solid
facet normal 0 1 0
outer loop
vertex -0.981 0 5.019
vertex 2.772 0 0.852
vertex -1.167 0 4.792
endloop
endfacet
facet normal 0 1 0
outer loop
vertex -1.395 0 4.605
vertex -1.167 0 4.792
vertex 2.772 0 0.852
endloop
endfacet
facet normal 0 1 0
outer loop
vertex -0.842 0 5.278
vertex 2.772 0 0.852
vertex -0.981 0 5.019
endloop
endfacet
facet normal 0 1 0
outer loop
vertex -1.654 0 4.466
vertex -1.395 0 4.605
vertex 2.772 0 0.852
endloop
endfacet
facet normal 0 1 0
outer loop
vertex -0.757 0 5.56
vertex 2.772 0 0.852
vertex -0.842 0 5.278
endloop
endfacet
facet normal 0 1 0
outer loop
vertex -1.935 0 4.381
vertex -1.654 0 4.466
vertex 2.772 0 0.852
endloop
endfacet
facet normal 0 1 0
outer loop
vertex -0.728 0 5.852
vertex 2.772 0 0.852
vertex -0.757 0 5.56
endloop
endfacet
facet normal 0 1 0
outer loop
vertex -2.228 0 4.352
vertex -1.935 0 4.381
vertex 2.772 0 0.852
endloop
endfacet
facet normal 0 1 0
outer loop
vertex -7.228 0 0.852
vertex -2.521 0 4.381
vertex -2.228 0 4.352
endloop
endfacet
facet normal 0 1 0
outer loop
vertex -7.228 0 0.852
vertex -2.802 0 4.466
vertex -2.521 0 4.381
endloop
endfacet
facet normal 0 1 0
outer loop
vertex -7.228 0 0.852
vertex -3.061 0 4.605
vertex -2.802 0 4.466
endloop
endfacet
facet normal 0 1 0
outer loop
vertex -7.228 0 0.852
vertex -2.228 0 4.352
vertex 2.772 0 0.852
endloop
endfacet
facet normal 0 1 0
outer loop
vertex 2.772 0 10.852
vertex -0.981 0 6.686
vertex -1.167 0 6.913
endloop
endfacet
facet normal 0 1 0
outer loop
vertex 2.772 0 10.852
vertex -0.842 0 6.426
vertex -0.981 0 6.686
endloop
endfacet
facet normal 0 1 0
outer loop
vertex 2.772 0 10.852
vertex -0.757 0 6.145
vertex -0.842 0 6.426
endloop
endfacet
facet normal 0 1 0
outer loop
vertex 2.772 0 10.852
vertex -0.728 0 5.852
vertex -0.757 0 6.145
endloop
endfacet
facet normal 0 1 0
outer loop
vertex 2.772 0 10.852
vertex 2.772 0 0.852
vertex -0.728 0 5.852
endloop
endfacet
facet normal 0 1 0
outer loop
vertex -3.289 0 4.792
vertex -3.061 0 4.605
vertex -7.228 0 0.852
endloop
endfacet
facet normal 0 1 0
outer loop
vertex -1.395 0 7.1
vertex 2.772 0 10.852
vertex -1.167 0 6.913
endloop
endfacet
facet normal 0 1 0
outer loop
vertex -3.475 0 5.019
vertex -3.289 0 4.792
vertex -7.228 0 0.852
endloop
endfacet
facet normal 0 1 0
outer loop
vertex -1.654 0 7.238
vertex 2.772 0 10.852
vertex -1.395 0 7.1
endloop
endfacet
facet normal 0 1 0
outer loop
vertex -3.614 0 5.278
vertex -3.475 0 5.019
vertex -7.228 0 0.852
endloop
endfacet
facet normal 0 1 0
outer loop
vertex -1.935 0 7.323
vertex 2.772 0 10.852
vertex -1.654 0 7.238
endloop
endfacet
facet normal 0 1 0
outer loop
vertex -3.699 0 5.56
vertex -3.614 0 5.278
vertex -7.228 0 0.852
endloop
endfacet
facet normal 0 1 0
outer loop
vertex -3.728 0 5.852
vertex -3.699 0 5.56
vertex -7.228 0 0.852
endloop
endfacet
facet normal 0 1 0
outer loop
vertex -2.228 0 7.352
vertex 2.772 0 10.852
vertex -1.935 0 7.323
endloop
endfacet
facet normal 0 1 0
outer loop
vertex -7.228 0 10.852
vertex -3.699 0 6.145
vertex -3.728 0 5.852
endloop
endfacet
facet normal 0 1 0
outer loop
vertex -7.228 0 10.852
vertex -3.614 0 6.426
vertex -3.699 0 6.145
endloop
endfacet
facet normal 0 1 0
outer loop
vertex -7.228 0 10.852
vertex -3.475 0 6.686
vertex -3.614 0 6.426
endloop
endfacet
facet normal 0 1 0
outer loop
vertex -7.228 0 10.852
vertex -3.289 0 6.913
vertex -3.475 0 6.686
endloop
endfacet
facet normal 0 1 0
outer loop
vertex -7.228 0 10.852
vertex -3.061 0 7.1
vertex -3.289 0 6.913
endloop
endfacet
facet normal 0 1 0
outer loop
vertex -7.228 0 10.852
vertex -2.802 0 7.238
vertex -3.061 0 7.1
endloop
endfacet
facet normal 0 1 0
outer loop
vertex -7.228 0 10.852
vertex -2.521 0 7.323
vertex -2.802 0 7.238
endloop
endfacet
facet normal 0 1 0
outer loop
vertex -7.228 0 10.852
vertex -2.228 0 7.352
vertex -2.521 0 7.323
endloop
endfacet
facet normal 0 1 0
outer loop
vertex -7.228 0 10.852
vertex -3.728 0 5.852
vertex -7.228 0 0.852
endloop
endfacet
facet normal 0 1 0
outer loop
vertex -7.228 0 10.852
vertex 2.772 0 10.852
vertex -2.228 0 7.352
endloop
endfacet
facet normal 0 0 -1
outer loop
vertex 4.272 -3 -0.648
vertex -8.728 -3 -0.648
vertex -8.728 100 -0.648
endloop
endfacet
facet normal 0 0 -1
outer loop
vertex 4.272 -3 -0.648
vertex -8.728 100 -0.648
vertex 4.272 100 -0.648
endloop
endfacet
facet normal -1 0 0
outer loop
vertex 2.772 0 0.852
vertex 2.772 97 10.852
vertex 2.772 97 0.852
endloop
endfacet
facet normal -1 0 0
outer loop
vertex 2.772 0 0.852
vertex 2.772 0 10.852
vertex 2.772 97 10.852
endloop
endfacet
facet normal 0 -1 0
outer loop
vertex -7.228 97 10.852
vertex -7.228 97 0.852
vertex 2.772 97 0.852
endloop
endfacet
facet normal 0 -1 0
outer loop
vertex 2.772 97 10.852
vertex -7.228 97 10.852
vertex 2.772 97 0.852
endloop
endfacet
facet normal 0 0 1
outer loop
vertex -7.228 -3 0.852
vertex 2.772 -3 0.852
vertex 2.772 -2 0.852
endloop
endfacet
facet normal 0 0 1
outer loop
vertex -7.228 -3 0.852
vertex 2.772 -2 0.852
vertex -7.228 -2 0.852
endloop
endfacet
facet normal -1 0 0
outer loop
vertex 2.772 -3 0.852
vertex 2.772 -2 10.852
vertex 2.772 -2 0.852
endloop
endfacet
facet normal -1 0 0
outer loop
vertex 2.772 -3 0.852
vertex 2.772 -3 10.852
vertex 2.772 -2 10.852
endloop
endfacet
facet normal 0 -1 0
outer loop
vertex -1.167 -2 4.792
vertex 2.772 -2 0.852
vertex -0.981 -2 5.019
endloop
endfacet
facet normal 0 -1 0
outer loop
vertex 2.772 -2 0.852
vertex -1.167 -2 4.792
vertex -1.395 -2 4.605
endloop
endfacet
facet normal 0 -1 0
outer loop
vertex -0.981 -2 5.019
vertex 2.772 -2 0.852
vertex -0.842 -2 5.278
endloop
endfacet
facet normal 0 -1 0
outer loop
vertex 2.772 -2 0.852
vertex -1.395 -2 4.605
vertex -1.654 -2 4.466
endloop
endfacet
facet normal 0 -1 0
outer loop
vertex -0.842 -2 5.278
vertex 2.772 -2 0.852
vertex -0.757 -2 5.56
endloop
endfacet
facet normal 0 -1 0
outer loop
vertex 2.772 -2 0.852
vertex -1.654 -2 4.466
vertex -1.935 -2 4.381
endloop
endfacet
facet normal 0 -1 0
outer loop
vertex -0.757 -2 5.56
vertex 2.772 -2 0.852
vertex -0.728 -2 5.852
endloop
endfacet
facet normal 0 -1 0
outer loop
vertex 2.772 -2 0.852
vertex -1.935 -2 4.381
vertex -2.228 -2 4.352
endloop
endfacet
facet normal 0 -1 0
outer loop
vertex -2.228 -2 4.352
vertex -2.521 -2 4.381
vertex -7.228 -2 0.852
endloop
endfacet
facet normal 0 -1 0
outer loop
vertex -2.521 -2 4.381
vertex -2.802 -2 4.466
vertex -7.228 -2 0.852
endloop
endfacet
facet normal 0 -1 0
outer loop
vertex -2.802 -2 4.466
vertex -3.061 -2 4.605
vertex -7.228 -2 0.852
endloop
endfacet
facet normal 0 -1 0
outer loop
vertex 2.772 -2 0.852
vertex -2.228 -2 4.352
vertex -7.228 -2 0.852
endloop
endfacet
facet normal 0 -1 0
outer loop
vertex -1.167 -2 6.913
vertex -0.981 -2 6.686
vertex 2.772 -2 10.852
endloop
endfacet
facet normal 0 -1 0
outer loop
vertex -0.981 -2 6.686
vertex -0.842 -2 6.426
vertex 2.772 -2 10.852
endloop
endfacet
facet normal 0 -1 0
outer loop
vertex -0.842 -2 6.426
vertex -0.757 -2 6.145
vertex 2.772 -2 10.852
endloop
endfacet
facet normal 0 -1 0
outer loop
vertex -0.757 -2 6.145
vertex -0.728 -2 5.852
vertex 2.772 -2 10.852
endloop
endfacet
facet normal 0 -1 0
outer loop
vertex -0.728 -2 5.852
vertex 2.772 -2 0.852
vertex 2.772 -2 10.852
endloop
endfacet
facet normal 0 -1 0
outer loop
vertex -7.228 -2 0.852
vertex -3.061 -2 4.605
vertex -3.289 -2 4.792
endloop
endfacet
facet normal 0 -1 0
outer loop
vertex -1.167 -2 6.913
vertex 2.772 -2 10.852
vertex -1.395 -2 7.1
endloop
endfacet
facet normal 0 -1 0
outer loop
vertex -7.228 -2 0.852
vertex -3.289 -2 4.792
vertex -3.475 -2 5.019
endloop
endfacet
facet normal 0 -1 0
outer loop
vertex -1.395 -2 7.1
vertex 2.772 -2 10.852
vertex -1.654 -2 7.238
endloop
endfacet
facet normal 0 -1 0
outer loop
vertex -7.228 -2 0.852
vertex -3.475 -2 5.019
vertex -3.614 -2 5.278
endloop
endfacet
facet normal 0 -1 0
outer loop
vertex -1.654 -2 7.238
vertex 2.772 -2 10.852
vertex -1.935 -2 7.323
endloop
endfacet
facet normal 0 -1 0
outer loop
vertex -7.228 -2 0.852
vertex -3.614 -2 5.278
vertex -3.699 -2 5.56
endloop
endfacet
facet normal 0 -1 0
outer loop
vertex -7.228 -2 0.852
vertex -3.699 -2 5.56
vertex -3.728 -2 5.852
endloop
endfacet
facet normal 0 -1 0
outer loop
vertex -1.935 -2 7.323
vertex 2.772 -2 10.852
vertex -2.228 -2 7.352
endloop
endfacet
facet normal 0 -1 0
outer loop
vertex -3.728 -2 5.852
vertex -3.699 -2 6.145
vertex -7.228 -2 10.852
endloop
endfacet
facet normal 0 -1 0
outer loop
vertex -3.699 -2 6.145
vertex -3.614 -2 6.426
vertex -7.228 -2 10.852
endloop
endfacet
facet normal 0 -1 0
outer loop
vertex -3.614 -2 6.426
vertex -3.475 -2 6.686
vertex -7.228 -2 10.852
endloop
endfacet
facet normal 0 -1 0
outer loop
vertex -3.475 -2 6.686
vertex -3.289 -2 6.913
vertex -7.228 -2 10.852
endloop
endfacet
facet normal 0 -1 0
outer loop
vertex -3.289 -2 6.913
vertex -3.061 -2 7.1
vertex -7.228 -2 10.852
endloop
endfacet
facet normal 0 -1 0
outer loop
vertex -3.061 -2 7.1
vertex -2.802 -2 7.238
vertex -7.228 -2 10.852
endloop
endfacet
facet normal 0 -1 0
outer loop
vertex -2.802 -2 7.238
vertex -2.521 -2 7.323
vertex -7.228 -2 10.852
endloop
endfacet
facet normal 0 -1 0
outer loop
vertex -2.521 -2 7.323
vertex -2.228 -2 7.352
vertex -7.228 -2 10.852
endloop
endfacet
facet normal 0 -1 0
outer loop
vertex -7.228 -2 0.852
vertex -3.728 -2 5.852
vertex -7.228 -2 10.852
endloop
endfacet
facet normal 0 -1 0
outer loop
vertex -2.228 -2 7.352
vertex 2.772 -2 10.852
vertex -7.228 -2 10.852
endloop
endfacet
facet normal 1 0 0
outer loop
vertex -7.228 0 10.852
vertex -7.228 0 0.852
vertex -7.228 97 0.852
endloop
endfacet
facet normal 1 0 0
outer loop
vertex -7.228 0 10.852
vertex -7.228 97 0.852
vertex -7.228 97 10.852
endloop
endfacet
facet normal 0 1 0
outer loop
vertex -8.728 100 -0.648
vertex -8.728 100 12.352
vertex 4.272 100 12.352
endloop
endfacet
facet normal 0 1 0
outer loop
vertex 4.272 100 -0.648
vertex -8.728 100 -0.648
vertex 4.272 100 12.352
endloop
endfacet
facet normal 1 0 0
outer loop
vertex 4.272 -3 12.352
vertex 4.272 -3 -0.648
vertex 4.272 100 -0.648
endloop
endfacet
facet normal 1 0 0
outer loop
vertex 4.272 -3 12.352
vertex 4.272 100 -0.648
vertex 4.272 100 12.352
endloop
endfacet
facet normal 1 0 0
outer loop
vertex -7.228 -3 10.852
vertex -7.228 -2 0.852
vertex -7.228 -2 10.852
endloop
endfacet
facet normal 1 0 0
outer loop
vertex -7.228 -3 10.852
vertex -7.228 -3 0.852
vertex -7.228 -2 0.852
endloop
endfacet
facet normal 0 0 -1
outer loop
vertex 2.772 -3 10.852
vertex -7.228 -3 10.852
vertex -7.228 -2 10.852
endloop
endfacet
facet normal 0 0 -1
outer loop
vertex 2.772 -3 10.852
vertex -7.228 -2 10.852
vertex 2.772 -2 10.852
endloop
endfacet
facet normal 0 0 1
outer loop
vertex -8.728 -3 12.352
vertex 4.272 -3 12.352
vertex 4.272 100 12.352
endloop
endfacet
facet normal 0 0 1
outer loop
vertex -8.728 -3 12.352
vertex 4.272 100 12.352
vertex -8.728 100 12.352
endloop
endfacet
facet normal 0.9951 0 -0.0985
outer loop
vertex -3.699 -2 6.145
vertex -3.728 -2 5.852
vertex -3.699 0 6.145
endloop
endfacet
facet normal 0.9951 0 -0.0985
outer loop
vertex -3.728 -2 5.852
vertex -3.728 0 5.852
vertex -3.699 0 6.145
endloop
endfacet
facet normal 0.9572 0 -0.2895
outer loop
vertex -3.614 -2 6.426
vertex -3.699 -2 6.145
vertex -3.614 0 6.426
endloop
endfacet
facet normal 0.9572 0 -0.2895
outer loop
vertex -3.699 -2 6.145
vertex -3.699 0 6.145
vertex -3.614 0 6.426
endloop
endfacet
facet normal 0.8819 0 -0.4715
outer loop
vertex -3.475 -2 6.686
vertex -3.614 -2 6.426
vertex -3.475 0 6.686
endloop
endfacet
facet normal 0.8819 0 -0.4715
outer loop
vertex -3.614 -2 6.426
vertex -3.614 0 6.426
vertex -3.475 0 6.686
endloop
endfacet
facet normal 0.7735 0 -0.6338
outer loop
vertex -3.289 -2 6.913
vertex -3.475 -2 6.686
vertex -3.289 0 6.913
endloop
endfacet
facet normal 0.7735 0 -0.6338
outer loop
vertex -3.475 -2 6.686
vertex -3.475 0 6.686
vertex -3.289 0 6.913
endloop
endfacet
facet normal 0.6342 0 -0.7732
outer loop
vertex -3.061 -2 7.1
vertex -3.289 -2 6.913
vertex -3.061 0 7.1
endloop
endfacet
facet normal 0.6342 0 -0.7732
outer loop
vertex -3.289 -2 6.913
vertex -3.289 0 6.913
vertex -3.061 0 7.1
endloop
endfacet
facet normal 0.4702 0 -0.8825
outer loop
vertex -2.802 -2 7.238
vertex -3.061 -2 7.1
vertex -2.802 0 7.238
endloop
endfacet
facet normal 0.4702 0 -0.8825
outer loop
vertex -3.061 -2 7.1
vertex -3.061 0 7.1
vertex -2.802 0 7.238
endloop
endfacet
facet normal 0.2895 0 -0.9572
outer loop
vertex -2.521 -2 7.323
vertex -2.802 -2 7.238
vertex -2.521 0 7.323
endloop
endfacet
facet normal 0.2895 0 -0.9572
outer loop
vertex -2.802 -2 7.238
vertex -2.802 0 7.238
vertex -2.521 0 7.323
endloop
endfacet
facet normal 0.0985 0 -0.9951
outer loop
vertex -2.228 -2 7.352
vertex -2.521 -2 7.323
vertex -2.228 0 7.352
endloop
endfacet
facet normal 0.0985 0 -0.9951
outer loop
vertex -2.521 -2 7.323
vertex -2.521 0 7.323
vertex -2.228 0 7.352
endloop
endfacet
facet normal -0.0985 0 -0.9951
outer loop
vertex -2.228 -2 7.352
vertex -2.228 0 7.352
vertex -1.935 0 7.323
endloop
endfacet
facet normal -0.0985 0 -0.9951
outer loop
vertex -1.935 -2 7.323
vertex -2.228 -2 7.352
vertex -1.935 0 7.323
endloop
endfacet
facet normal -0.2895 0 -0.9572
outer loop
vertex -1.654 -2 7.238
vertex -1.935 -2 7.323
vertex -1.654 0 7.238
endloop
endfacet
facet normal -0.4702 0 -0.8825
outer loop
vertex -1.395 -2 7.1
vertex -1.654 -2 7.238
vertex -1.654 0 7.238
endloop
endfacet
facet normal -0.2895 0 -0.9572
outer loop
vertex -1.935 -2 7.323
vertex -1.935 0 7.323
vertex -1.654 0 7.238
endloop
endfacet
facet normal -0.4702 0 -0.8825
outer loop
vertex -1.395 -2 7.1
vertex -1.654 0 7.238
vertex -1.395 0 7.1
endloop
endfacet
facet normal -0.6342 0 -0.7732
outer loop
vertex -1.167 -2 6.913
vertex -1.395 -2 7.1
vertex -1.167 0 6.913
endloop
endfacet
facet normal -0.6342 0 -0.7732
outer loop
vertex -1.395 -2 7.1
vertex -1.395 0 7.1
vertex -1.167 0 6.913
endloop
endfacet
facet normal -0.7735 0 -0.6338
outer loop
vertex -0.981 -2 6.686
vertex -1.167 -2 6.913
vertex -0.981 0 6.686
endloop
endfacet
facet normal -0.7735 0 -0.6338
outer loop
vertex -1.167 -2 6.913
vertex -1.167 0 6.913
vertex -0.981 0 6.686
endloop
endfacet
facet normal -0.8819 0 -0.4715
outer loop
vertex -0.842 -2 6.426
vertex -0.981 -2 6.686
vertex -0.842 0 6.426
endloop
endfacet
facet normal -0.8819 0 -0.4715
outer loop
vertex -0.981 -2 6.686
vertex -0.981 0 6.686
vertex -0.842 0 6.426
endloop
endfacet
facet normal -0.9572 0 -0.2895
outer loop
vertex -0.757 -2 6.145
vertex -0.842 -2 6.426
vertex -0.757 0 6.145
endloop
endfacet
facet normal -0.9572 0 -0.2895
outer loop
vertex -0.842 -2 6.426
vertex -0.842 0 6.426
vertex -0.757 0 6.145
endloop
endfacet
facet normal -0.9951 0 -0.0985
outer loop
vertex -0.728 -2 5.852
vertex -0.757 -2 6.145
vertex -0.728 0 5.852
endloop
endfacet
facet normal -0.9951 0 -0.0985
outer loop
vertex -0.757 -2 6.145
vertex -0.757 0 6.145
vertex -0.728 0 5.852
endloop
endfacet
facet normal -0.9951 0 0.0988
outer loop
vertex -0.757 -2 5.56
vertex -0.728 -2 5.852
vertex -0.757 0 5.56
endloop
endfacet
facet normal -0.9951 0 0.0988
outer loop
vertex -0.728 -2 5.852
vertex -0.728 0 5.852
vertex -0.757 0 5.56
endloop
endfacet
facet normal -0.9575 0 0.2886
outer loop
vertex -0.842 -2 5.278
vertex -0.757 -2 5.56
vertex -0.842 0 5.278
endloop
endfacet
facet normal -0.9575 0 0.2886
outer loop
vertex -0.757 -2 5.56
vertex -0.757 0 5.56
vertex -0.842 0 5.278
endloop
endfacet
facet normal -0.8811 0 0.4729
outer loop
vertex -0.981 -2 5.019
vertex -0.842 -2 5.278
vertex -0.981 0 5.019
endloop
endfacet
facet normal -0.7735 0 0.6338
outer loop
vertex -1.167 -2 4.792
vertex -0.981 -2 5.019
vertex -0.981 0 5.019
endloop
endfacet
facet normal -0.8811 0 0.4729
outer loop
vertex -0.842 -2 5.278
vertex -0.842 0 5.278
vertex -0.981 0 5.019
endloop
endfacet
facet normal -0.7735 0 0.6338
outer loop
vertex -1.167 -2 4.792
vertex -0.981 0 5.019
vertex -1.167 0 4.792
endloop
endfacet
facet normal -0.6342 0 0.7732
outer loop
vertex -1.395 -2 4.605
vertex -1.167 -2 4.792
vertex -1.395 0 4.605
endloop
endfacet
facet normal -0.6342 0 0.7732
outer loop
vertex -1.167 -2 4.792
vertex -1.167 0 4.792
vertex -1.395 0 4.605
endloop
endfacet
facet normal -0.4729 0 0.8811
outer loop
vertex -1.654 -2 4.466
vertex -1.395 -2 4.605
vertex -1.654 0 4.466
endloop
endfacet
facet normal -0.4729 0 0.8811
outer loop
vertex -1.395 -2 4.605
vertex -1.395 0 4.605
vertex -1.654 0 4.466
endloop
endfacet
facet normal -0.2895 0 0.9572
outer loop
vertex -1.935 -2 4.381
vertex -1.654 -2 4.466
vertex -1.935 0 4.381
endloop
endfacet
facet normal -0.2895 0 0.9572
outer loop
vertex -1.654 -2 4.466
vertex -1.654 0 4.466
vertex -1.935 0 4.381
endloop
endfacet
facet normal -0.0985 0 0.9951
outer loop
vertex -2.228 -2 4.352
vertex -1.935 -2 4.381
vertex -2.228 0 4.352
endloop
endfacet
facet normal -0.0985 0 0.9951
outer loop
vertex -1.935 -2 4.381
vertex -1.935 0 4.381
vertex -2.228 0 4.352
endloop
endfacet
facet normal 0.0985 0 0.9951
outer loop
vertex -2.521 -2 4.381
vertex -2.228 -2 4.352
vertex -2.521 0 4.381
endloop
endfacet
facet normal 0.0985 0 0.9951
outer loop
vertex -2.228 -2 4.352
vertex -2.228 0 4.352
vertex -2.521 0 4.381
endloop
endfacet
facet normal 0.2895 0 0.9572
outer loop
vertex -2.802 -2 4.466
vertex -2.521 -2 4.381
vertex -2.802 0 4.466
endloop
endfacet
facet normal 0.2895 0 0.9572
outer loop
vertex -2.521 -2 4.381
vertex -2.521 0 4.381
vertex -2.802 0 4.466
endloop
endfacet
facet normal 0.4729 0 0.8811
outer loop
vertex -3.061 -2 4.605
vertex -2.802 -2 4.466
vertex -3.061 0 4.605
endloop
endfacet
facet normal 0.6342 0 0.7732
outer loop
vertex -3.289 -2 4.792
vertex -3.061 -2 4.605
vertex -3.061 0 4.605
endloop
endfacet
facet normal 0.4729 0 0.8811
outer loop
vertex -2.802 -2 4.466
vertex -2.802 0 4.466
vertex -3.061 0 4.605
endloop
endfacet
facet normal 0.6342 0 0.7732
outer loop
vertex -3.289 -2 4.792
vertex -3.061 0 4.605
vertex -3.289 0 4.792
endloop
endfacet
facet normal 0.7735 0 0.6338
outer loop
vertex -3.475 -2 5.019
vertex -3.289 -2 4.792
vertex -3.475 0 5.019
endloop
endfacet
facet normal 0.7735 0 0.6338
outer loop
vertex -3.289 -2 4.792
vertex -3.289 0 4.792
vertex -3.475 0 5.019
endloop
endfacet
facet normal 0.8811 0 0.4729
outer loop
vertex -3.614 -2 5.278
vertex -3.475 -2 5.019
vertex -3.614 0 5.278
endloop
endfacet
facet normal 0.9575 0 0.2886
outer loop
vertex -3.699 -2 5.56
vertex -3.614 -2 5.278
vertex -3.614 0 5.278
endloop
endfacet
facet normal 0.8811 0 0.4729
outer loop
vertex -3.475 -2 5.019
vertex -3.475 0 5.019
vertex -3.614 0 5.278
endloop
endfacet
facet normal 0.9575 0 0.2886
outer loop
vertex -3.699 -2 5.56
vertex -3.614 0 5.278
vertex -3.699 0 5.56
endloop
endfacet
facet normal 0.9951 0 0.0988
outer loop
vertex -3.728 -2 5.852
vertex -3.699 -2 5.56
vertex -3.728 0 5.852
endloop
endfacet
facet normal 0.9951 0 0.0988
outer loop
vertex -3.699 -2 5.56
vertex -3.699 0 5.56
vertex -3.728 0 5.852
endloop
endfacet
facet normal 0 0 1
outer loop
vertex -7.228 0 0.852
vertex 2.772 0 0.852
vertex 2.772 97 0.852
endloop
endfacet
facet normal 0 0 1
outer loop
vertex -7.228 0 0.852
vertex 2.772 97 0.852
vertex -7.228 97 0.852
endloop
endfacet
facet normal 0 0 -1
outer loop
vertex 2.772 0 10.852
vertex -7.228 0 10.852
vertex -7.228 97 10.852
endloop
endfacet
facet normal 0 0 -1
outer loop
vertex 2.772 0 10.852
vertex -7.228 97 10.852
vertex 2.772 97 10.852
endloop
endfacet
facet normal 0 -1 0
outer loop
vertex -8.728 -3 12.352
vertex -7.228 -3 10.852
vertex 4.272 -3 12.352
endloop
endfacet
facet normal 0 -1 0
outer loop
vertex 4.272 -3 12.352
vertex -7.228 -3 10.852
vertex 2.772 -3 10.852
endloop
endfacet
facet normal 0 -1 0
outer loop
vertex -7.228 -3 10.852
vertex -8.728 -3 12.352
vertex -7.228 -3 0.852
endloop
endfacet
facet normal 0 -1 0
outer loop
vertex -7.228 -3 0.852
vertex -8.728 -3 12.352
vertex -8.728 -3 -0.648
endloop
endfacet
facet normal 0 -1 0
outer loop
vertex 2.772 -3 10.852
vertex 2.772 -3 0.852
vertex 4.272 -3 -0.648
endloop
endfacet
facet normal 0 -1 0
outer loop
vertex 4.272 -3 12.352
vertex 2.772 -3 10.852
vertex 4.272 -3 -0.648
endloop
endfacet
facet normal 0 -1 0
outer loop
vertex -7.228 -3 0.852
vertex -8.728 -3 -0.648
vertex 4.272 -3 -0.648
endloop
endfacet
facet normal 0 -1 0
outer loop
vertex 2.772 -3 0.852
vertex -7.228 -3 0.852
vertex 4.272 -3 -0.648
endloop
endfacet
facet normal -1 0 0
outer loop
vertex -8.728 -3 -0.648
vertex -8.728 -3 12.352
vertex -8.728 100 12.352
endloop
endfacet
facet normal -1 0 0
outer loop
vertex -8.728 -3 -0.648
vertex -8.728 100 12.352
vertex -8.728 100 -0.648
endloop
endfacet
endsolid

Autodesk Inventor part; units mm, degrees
ref_plane "YZ Plane" through (0, 0, 0) normal (1, 0, 0) x (0, 1, 0)
ref_plane "XZ Plane" through (0, 0, 0) normal (0, 1, 0) x (-1, 0, 0)
ref_plane "XY Plane" through (0, 0, 0) normal (0, 0, 1) x (1, 0, 0)
sketch "Sketch1" plane through (0, 0, 0) normal (0, 1, 0) x (-1, 0, 0)
  circle A0 centre (2.2281, 5.8523) radius 1.5 projected
  circle A1 centre (2.2281, 5.8523) radius 3.5
  line L0 (2.2281, 2.3523) -> (-0.803, 4.1023)
  line L1 (-0.803, 4.1023) -> (-0.803, 7.6023)
  line L2 (-0.803, 7.6023) -> (2.2281, 9.3523)
  line L3 (2.2281, 9.3523) -> (5.2592, 7.6023)
  line L4 (5.2592, 7.6023) -> (5.2592, 4.1023)
  line L5 (5.2592, 4.1023) -> (2.2281, 2.3523)
  point P0 (0, 0)
  dimension "d0" = 7
extrude "Extrusion1" add sketch "Sketch1" against normal blind 2 contours L4 L5 L0 L1 L2 L3
thread "Thread1" size "M3x0.5" class "6H" standard "ANSI Metric M Profile" full length
sketch "Sketch2" plane through (0, -2, 0) normal (0, -1, 0) x (1, 0, 0)
  line L0 (-5.2592, 7.6023) -> (-5.2592, 4.1023) projected
  line L1 (-5.2592, 4.1023) -> (-2.2281, 2.3523) projected
  line L2 (-2.2281, 2.3523) -> (0.803, 4.1023) projected
  line L3 (0.803, 4.1023) -> (0.803, 7.6023) projected
  line L4 (0.803, 7.6023) -> (-2.2281, 9.3523) projected
  line L5 (-2.2281, 9.3523) -> (-5.2592, 7.6023) projected
  circle A0 centre (-2.2281, 5.8523) radius 1.5 projected
  line L6 (-7.2281, 0.8523) -> (2.7719, 0.8523)
  line L7 (2.7719, 0.8523) -> (2.7719, 10.8523)
  line L8 (2.7719, 10.8523) -> (-7.2281, 10.8523)
  line L9 (-7.2281, 10.8523) -> (-7.2281, 0.8523)
  line L10 (-7.2281, 0.8523) -> (2.7719, 10.8523) construction
  line L11 (2.7719, 0.8523) -> (-7.2281, 10.8523) construction
  point P0 (0, 0)
  dimension "d5" = 10
  dimension "d6" = 10
extrude "Extrusion2" add sketch "Sketch2" against normal blind 2 contours L9 L8 L7 L6
sketch "Sketch3" plane through (0, 0, 0) normal (0, 1, 0) x (1, 0, 0)
  line L0 (2.7719, -10.8523) -> (2.7719, -0.8523) projected
  line L1 (2.7719, -0.8523) -> (-7.2281, -0.8523) projected
  line L2 (-7.2281, -0.8523) -> (-7.2281, -10.8523) projected
  line L3 (-7.2281, -10.8523) -> (2.7719, -10.8523) projected
  circle A0 centre (-2.2281, -5.8523) radius 1.5 projected
  line L4 (-8.7281, 0.6477) -> (4.2719, 0.6477)
  line L5 (4.2719, 0.6477) -> (4.2719, -12.3523)
  line L6 (4.2719, -12.3523) -> (-8.7281, -12.3523)
  line L7 (-8.7281, -12.3523) -> (-8.7281, 0.6477)
  line L8 (-8.7281, 0.6477) -> (4.2719, -12.3523) construction
  line L9 (4.2719, 0.6477) -> (-8.7281, -12.3523) construction
  point P0 (0, 0)
  dimension "d9" = 10
  dimension "d10" = 13
  dimension "d11" = 13
extrude "Extrusion3" add sketch "Sketch3" along normal blind 100 and the other way blind 3 contours L4 L5 L6 L7
sketch "Sketch4" plane through (0, 100, 0) normal (0, 1, 0) x (1, 0, 0)
  line L0 (-8.7281, -12.3523) -> (4.2719, -12.3523) projected
  line L1 (4.2719, -12.3523) -> (4.2719, 0.6477) projected
  line L2 (4.2719, 0.6477) -> (-8.7281, 0.6477) projected
  line L3 (-8.7281, 0.6477) -> (-8.7281, -12.3523) projected
  line L4 (2.7719, -10.8523) -> (-7.2281, -10.8523) projected
  line L5 (-7.2281, -10.8523) -> (-7.2281, -0.8523) projected
  line L6 (-7.2281, -0.8523) -> (2.7719, -0.8523) projected
  line L7 (2.7719, -0.8523) -> (2.7719, -10.8523) projected
  point P0 (0, 0)
extrude "Extrusion4" add sketch "Sketch4" against normal blind 3 contours L4 L5 L6 L7
properties part number "Nut"
